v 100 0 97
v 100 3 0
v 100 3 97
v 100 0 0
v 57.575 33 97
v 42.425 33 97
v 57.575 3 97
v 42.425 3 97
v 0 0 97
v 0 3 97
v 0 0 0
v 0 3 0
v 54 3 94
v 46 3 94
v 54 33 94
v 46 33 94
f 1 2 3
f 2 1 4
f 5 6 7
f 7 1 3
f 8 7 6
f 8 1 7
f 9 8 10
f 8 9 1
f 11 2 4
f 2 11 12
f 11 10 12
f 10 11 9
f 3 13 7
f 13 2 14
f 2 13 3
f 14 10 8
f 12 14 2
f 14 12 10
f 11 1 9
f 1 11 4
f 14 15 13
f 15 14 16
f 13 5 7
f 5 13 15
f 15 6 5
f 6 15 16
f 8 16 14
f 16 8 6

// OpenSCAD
// file: ../modules/dovetail.scad
// Dovetail Joint Primitives
// Chamfered dovetail joints for support-free 3D printing

// Default parameters
default_dovetail_angle = 50;      // Angle from vertical (degrees)
default_dovetail_height = 5;      // Trapezoid height (mm)
default_dovetail_length = 30;     // Length along edge (mm)
default_dovetail_base_width = 8;  // Width at narrow end (mm)
default_clearance = 0.3;          // Clearance per side (mm)

// Calculate top width from base width, height, and angle
function dovetail_top_width(base_width, height, angle) =
    base_width + 2 * height * tan(angle);

// Male dovetail rail - trapezoidal extrusion
// Origin at center of the rail base
// Cross-section in YZ plane: width in Y, height in +Z
// Extrudes along +X (length direction)
// Rail widens in +Z direction (trapezoid shape)
module male_dovetail(
    length = default_dovetail_length,
    height = default_dovetail_height,
    base_width = default_dovetail_base_width,
    angle = default_dovetail_angle
) {
    top_width = dovetail_top_width(base_width, height, angle);

    // Trapezoidal cross-section rotated 90° CW on Z then 90° CW on X
    rotate([-90, 180, 90])
    linear_extrude(height = length, center = true)
        polygon([
            [-base_width/2, 0],      // bottom left
            [base_width/2, 0],       // bottom right
            [top_width/2, height],   // top right
            [-top_width/2, height]   // top left
        ]);
}

// Female dovetail channel - trapezoidal cutout
// Same profile as male but with clearance added
// Origin at center of the channel base
// Cross-section in YZ plane: width in Y, height in +Z
// Extrudes along +X (length direction)
// Channel widens in +Z direction (trapezoid shape)
module female_dovetail(
    length = default_dovetail_length,
    height = default_dovetail_height,
    base_width = default_dovetail_base_width,
    angle = default_dovetail_angle,
    clearance = default_clearance
) {
    // Add clearance to all dimensions
    adj_base_width = base_width + 2 * clearance;
    adj_height = height + clearance;
    top_width = dovetail_top_width(adj_base_width, adj_height, angle);
    adj_length = length + 2 * clearance;

    // Trapezoidal cross-section rotated 90° CW on Z then 90° CW on X
    rotate([-90, 0, 0])
    rotate([0, 0, -90])
    linear_extrude(height = adj_length, center = true)
        polygon([
            [-adj_base_width/2, -clearance],  // bottom left (extra height for clearance)
            [adj_base_width/2, -clearance],   // bottom right
            [top_width/2, adj_height],        // top right
            [-top_width/2, adj_height]        // top left
        ]);
}

// Test visualization
module dovetail_test() {
    // Show male (red) and female (blue, transparent) overlapping
    color("red") male_dovetail();
    color("blue", 0.3) female_dovetail();
}

// Uncomment to test
dovetail_test();
// main file
// Front Panel with Male Dovetail
// Male dovetail rail on top edge to mate with top panel

use <../modules/dovetail.scad>

// Panel parameters (can be overridden)
panel_width = 100;        // X dimension (matches top panel width)
panel_height = 100;       // Z dimension (vertical height of front panel)
panel_thickness = 3;      // Y dimension (wall thickness)

// Dovetail parameters (must match top panel channel)
dovetail_angle = 50;
dovetail_height = 3;      // Must match top panel channel height
dovetail_length = 30;
dovetail_base_width = 8;

// Scale factor for prototyping
scale_factor = 1.0;

// Scaled dimensions
scaled_width = panel_width * scale_factor;
scaled_panel_height = panel_height * scale_factor;
scaled_thickness = panel_thickness * scale_factor;
scaled_dovetail_height = dovetail_height * scale_factor;
scaled_dovetail_length = dovetail_length * scale_factor;
scaled_dovetail_base_width = dovetail_base_width * scale_factor;

module front_panel(
    width = scaled_width,
    panel_h = scaled_panel_height,
    thickness = scaled_thickness,
    dt_angle = dovetail_angle,
    dt_height = scaled_dovetail_height,
    dt_length = scaled_dovetail_length,
    dt_base_width = scaled_dovetail_base_width
) {
    // Panel is vertical: width in X, thickness in Y, height in Z
    // Origin at front-bottom-left corner

    union() {
        // Base panel - stops below dovetail
        cube([width, thickness, panel_h - dt_height]);

        // Male dovetail - top flush with panel top at Z=panel_h
        // After rotate([90,0,0]), dovetail base is at Z and widens toward -Z
        // Place at Z=panel_h so top is flush, dovetail extends down to panel_h-dt_height
        translate([width/2, thickness + scaled_dovetail_length/2, panel_h - (scaled_dovetail_height*2) ])
            rotate([0, 0, 90])
            male_dovetail(
                length = dt_length,
                height = dt_height,
                base_width = dt_base_width,
                angle = dt_angle
            );
    }
}

// Render the panel
color("DarkGray") front_panel();
